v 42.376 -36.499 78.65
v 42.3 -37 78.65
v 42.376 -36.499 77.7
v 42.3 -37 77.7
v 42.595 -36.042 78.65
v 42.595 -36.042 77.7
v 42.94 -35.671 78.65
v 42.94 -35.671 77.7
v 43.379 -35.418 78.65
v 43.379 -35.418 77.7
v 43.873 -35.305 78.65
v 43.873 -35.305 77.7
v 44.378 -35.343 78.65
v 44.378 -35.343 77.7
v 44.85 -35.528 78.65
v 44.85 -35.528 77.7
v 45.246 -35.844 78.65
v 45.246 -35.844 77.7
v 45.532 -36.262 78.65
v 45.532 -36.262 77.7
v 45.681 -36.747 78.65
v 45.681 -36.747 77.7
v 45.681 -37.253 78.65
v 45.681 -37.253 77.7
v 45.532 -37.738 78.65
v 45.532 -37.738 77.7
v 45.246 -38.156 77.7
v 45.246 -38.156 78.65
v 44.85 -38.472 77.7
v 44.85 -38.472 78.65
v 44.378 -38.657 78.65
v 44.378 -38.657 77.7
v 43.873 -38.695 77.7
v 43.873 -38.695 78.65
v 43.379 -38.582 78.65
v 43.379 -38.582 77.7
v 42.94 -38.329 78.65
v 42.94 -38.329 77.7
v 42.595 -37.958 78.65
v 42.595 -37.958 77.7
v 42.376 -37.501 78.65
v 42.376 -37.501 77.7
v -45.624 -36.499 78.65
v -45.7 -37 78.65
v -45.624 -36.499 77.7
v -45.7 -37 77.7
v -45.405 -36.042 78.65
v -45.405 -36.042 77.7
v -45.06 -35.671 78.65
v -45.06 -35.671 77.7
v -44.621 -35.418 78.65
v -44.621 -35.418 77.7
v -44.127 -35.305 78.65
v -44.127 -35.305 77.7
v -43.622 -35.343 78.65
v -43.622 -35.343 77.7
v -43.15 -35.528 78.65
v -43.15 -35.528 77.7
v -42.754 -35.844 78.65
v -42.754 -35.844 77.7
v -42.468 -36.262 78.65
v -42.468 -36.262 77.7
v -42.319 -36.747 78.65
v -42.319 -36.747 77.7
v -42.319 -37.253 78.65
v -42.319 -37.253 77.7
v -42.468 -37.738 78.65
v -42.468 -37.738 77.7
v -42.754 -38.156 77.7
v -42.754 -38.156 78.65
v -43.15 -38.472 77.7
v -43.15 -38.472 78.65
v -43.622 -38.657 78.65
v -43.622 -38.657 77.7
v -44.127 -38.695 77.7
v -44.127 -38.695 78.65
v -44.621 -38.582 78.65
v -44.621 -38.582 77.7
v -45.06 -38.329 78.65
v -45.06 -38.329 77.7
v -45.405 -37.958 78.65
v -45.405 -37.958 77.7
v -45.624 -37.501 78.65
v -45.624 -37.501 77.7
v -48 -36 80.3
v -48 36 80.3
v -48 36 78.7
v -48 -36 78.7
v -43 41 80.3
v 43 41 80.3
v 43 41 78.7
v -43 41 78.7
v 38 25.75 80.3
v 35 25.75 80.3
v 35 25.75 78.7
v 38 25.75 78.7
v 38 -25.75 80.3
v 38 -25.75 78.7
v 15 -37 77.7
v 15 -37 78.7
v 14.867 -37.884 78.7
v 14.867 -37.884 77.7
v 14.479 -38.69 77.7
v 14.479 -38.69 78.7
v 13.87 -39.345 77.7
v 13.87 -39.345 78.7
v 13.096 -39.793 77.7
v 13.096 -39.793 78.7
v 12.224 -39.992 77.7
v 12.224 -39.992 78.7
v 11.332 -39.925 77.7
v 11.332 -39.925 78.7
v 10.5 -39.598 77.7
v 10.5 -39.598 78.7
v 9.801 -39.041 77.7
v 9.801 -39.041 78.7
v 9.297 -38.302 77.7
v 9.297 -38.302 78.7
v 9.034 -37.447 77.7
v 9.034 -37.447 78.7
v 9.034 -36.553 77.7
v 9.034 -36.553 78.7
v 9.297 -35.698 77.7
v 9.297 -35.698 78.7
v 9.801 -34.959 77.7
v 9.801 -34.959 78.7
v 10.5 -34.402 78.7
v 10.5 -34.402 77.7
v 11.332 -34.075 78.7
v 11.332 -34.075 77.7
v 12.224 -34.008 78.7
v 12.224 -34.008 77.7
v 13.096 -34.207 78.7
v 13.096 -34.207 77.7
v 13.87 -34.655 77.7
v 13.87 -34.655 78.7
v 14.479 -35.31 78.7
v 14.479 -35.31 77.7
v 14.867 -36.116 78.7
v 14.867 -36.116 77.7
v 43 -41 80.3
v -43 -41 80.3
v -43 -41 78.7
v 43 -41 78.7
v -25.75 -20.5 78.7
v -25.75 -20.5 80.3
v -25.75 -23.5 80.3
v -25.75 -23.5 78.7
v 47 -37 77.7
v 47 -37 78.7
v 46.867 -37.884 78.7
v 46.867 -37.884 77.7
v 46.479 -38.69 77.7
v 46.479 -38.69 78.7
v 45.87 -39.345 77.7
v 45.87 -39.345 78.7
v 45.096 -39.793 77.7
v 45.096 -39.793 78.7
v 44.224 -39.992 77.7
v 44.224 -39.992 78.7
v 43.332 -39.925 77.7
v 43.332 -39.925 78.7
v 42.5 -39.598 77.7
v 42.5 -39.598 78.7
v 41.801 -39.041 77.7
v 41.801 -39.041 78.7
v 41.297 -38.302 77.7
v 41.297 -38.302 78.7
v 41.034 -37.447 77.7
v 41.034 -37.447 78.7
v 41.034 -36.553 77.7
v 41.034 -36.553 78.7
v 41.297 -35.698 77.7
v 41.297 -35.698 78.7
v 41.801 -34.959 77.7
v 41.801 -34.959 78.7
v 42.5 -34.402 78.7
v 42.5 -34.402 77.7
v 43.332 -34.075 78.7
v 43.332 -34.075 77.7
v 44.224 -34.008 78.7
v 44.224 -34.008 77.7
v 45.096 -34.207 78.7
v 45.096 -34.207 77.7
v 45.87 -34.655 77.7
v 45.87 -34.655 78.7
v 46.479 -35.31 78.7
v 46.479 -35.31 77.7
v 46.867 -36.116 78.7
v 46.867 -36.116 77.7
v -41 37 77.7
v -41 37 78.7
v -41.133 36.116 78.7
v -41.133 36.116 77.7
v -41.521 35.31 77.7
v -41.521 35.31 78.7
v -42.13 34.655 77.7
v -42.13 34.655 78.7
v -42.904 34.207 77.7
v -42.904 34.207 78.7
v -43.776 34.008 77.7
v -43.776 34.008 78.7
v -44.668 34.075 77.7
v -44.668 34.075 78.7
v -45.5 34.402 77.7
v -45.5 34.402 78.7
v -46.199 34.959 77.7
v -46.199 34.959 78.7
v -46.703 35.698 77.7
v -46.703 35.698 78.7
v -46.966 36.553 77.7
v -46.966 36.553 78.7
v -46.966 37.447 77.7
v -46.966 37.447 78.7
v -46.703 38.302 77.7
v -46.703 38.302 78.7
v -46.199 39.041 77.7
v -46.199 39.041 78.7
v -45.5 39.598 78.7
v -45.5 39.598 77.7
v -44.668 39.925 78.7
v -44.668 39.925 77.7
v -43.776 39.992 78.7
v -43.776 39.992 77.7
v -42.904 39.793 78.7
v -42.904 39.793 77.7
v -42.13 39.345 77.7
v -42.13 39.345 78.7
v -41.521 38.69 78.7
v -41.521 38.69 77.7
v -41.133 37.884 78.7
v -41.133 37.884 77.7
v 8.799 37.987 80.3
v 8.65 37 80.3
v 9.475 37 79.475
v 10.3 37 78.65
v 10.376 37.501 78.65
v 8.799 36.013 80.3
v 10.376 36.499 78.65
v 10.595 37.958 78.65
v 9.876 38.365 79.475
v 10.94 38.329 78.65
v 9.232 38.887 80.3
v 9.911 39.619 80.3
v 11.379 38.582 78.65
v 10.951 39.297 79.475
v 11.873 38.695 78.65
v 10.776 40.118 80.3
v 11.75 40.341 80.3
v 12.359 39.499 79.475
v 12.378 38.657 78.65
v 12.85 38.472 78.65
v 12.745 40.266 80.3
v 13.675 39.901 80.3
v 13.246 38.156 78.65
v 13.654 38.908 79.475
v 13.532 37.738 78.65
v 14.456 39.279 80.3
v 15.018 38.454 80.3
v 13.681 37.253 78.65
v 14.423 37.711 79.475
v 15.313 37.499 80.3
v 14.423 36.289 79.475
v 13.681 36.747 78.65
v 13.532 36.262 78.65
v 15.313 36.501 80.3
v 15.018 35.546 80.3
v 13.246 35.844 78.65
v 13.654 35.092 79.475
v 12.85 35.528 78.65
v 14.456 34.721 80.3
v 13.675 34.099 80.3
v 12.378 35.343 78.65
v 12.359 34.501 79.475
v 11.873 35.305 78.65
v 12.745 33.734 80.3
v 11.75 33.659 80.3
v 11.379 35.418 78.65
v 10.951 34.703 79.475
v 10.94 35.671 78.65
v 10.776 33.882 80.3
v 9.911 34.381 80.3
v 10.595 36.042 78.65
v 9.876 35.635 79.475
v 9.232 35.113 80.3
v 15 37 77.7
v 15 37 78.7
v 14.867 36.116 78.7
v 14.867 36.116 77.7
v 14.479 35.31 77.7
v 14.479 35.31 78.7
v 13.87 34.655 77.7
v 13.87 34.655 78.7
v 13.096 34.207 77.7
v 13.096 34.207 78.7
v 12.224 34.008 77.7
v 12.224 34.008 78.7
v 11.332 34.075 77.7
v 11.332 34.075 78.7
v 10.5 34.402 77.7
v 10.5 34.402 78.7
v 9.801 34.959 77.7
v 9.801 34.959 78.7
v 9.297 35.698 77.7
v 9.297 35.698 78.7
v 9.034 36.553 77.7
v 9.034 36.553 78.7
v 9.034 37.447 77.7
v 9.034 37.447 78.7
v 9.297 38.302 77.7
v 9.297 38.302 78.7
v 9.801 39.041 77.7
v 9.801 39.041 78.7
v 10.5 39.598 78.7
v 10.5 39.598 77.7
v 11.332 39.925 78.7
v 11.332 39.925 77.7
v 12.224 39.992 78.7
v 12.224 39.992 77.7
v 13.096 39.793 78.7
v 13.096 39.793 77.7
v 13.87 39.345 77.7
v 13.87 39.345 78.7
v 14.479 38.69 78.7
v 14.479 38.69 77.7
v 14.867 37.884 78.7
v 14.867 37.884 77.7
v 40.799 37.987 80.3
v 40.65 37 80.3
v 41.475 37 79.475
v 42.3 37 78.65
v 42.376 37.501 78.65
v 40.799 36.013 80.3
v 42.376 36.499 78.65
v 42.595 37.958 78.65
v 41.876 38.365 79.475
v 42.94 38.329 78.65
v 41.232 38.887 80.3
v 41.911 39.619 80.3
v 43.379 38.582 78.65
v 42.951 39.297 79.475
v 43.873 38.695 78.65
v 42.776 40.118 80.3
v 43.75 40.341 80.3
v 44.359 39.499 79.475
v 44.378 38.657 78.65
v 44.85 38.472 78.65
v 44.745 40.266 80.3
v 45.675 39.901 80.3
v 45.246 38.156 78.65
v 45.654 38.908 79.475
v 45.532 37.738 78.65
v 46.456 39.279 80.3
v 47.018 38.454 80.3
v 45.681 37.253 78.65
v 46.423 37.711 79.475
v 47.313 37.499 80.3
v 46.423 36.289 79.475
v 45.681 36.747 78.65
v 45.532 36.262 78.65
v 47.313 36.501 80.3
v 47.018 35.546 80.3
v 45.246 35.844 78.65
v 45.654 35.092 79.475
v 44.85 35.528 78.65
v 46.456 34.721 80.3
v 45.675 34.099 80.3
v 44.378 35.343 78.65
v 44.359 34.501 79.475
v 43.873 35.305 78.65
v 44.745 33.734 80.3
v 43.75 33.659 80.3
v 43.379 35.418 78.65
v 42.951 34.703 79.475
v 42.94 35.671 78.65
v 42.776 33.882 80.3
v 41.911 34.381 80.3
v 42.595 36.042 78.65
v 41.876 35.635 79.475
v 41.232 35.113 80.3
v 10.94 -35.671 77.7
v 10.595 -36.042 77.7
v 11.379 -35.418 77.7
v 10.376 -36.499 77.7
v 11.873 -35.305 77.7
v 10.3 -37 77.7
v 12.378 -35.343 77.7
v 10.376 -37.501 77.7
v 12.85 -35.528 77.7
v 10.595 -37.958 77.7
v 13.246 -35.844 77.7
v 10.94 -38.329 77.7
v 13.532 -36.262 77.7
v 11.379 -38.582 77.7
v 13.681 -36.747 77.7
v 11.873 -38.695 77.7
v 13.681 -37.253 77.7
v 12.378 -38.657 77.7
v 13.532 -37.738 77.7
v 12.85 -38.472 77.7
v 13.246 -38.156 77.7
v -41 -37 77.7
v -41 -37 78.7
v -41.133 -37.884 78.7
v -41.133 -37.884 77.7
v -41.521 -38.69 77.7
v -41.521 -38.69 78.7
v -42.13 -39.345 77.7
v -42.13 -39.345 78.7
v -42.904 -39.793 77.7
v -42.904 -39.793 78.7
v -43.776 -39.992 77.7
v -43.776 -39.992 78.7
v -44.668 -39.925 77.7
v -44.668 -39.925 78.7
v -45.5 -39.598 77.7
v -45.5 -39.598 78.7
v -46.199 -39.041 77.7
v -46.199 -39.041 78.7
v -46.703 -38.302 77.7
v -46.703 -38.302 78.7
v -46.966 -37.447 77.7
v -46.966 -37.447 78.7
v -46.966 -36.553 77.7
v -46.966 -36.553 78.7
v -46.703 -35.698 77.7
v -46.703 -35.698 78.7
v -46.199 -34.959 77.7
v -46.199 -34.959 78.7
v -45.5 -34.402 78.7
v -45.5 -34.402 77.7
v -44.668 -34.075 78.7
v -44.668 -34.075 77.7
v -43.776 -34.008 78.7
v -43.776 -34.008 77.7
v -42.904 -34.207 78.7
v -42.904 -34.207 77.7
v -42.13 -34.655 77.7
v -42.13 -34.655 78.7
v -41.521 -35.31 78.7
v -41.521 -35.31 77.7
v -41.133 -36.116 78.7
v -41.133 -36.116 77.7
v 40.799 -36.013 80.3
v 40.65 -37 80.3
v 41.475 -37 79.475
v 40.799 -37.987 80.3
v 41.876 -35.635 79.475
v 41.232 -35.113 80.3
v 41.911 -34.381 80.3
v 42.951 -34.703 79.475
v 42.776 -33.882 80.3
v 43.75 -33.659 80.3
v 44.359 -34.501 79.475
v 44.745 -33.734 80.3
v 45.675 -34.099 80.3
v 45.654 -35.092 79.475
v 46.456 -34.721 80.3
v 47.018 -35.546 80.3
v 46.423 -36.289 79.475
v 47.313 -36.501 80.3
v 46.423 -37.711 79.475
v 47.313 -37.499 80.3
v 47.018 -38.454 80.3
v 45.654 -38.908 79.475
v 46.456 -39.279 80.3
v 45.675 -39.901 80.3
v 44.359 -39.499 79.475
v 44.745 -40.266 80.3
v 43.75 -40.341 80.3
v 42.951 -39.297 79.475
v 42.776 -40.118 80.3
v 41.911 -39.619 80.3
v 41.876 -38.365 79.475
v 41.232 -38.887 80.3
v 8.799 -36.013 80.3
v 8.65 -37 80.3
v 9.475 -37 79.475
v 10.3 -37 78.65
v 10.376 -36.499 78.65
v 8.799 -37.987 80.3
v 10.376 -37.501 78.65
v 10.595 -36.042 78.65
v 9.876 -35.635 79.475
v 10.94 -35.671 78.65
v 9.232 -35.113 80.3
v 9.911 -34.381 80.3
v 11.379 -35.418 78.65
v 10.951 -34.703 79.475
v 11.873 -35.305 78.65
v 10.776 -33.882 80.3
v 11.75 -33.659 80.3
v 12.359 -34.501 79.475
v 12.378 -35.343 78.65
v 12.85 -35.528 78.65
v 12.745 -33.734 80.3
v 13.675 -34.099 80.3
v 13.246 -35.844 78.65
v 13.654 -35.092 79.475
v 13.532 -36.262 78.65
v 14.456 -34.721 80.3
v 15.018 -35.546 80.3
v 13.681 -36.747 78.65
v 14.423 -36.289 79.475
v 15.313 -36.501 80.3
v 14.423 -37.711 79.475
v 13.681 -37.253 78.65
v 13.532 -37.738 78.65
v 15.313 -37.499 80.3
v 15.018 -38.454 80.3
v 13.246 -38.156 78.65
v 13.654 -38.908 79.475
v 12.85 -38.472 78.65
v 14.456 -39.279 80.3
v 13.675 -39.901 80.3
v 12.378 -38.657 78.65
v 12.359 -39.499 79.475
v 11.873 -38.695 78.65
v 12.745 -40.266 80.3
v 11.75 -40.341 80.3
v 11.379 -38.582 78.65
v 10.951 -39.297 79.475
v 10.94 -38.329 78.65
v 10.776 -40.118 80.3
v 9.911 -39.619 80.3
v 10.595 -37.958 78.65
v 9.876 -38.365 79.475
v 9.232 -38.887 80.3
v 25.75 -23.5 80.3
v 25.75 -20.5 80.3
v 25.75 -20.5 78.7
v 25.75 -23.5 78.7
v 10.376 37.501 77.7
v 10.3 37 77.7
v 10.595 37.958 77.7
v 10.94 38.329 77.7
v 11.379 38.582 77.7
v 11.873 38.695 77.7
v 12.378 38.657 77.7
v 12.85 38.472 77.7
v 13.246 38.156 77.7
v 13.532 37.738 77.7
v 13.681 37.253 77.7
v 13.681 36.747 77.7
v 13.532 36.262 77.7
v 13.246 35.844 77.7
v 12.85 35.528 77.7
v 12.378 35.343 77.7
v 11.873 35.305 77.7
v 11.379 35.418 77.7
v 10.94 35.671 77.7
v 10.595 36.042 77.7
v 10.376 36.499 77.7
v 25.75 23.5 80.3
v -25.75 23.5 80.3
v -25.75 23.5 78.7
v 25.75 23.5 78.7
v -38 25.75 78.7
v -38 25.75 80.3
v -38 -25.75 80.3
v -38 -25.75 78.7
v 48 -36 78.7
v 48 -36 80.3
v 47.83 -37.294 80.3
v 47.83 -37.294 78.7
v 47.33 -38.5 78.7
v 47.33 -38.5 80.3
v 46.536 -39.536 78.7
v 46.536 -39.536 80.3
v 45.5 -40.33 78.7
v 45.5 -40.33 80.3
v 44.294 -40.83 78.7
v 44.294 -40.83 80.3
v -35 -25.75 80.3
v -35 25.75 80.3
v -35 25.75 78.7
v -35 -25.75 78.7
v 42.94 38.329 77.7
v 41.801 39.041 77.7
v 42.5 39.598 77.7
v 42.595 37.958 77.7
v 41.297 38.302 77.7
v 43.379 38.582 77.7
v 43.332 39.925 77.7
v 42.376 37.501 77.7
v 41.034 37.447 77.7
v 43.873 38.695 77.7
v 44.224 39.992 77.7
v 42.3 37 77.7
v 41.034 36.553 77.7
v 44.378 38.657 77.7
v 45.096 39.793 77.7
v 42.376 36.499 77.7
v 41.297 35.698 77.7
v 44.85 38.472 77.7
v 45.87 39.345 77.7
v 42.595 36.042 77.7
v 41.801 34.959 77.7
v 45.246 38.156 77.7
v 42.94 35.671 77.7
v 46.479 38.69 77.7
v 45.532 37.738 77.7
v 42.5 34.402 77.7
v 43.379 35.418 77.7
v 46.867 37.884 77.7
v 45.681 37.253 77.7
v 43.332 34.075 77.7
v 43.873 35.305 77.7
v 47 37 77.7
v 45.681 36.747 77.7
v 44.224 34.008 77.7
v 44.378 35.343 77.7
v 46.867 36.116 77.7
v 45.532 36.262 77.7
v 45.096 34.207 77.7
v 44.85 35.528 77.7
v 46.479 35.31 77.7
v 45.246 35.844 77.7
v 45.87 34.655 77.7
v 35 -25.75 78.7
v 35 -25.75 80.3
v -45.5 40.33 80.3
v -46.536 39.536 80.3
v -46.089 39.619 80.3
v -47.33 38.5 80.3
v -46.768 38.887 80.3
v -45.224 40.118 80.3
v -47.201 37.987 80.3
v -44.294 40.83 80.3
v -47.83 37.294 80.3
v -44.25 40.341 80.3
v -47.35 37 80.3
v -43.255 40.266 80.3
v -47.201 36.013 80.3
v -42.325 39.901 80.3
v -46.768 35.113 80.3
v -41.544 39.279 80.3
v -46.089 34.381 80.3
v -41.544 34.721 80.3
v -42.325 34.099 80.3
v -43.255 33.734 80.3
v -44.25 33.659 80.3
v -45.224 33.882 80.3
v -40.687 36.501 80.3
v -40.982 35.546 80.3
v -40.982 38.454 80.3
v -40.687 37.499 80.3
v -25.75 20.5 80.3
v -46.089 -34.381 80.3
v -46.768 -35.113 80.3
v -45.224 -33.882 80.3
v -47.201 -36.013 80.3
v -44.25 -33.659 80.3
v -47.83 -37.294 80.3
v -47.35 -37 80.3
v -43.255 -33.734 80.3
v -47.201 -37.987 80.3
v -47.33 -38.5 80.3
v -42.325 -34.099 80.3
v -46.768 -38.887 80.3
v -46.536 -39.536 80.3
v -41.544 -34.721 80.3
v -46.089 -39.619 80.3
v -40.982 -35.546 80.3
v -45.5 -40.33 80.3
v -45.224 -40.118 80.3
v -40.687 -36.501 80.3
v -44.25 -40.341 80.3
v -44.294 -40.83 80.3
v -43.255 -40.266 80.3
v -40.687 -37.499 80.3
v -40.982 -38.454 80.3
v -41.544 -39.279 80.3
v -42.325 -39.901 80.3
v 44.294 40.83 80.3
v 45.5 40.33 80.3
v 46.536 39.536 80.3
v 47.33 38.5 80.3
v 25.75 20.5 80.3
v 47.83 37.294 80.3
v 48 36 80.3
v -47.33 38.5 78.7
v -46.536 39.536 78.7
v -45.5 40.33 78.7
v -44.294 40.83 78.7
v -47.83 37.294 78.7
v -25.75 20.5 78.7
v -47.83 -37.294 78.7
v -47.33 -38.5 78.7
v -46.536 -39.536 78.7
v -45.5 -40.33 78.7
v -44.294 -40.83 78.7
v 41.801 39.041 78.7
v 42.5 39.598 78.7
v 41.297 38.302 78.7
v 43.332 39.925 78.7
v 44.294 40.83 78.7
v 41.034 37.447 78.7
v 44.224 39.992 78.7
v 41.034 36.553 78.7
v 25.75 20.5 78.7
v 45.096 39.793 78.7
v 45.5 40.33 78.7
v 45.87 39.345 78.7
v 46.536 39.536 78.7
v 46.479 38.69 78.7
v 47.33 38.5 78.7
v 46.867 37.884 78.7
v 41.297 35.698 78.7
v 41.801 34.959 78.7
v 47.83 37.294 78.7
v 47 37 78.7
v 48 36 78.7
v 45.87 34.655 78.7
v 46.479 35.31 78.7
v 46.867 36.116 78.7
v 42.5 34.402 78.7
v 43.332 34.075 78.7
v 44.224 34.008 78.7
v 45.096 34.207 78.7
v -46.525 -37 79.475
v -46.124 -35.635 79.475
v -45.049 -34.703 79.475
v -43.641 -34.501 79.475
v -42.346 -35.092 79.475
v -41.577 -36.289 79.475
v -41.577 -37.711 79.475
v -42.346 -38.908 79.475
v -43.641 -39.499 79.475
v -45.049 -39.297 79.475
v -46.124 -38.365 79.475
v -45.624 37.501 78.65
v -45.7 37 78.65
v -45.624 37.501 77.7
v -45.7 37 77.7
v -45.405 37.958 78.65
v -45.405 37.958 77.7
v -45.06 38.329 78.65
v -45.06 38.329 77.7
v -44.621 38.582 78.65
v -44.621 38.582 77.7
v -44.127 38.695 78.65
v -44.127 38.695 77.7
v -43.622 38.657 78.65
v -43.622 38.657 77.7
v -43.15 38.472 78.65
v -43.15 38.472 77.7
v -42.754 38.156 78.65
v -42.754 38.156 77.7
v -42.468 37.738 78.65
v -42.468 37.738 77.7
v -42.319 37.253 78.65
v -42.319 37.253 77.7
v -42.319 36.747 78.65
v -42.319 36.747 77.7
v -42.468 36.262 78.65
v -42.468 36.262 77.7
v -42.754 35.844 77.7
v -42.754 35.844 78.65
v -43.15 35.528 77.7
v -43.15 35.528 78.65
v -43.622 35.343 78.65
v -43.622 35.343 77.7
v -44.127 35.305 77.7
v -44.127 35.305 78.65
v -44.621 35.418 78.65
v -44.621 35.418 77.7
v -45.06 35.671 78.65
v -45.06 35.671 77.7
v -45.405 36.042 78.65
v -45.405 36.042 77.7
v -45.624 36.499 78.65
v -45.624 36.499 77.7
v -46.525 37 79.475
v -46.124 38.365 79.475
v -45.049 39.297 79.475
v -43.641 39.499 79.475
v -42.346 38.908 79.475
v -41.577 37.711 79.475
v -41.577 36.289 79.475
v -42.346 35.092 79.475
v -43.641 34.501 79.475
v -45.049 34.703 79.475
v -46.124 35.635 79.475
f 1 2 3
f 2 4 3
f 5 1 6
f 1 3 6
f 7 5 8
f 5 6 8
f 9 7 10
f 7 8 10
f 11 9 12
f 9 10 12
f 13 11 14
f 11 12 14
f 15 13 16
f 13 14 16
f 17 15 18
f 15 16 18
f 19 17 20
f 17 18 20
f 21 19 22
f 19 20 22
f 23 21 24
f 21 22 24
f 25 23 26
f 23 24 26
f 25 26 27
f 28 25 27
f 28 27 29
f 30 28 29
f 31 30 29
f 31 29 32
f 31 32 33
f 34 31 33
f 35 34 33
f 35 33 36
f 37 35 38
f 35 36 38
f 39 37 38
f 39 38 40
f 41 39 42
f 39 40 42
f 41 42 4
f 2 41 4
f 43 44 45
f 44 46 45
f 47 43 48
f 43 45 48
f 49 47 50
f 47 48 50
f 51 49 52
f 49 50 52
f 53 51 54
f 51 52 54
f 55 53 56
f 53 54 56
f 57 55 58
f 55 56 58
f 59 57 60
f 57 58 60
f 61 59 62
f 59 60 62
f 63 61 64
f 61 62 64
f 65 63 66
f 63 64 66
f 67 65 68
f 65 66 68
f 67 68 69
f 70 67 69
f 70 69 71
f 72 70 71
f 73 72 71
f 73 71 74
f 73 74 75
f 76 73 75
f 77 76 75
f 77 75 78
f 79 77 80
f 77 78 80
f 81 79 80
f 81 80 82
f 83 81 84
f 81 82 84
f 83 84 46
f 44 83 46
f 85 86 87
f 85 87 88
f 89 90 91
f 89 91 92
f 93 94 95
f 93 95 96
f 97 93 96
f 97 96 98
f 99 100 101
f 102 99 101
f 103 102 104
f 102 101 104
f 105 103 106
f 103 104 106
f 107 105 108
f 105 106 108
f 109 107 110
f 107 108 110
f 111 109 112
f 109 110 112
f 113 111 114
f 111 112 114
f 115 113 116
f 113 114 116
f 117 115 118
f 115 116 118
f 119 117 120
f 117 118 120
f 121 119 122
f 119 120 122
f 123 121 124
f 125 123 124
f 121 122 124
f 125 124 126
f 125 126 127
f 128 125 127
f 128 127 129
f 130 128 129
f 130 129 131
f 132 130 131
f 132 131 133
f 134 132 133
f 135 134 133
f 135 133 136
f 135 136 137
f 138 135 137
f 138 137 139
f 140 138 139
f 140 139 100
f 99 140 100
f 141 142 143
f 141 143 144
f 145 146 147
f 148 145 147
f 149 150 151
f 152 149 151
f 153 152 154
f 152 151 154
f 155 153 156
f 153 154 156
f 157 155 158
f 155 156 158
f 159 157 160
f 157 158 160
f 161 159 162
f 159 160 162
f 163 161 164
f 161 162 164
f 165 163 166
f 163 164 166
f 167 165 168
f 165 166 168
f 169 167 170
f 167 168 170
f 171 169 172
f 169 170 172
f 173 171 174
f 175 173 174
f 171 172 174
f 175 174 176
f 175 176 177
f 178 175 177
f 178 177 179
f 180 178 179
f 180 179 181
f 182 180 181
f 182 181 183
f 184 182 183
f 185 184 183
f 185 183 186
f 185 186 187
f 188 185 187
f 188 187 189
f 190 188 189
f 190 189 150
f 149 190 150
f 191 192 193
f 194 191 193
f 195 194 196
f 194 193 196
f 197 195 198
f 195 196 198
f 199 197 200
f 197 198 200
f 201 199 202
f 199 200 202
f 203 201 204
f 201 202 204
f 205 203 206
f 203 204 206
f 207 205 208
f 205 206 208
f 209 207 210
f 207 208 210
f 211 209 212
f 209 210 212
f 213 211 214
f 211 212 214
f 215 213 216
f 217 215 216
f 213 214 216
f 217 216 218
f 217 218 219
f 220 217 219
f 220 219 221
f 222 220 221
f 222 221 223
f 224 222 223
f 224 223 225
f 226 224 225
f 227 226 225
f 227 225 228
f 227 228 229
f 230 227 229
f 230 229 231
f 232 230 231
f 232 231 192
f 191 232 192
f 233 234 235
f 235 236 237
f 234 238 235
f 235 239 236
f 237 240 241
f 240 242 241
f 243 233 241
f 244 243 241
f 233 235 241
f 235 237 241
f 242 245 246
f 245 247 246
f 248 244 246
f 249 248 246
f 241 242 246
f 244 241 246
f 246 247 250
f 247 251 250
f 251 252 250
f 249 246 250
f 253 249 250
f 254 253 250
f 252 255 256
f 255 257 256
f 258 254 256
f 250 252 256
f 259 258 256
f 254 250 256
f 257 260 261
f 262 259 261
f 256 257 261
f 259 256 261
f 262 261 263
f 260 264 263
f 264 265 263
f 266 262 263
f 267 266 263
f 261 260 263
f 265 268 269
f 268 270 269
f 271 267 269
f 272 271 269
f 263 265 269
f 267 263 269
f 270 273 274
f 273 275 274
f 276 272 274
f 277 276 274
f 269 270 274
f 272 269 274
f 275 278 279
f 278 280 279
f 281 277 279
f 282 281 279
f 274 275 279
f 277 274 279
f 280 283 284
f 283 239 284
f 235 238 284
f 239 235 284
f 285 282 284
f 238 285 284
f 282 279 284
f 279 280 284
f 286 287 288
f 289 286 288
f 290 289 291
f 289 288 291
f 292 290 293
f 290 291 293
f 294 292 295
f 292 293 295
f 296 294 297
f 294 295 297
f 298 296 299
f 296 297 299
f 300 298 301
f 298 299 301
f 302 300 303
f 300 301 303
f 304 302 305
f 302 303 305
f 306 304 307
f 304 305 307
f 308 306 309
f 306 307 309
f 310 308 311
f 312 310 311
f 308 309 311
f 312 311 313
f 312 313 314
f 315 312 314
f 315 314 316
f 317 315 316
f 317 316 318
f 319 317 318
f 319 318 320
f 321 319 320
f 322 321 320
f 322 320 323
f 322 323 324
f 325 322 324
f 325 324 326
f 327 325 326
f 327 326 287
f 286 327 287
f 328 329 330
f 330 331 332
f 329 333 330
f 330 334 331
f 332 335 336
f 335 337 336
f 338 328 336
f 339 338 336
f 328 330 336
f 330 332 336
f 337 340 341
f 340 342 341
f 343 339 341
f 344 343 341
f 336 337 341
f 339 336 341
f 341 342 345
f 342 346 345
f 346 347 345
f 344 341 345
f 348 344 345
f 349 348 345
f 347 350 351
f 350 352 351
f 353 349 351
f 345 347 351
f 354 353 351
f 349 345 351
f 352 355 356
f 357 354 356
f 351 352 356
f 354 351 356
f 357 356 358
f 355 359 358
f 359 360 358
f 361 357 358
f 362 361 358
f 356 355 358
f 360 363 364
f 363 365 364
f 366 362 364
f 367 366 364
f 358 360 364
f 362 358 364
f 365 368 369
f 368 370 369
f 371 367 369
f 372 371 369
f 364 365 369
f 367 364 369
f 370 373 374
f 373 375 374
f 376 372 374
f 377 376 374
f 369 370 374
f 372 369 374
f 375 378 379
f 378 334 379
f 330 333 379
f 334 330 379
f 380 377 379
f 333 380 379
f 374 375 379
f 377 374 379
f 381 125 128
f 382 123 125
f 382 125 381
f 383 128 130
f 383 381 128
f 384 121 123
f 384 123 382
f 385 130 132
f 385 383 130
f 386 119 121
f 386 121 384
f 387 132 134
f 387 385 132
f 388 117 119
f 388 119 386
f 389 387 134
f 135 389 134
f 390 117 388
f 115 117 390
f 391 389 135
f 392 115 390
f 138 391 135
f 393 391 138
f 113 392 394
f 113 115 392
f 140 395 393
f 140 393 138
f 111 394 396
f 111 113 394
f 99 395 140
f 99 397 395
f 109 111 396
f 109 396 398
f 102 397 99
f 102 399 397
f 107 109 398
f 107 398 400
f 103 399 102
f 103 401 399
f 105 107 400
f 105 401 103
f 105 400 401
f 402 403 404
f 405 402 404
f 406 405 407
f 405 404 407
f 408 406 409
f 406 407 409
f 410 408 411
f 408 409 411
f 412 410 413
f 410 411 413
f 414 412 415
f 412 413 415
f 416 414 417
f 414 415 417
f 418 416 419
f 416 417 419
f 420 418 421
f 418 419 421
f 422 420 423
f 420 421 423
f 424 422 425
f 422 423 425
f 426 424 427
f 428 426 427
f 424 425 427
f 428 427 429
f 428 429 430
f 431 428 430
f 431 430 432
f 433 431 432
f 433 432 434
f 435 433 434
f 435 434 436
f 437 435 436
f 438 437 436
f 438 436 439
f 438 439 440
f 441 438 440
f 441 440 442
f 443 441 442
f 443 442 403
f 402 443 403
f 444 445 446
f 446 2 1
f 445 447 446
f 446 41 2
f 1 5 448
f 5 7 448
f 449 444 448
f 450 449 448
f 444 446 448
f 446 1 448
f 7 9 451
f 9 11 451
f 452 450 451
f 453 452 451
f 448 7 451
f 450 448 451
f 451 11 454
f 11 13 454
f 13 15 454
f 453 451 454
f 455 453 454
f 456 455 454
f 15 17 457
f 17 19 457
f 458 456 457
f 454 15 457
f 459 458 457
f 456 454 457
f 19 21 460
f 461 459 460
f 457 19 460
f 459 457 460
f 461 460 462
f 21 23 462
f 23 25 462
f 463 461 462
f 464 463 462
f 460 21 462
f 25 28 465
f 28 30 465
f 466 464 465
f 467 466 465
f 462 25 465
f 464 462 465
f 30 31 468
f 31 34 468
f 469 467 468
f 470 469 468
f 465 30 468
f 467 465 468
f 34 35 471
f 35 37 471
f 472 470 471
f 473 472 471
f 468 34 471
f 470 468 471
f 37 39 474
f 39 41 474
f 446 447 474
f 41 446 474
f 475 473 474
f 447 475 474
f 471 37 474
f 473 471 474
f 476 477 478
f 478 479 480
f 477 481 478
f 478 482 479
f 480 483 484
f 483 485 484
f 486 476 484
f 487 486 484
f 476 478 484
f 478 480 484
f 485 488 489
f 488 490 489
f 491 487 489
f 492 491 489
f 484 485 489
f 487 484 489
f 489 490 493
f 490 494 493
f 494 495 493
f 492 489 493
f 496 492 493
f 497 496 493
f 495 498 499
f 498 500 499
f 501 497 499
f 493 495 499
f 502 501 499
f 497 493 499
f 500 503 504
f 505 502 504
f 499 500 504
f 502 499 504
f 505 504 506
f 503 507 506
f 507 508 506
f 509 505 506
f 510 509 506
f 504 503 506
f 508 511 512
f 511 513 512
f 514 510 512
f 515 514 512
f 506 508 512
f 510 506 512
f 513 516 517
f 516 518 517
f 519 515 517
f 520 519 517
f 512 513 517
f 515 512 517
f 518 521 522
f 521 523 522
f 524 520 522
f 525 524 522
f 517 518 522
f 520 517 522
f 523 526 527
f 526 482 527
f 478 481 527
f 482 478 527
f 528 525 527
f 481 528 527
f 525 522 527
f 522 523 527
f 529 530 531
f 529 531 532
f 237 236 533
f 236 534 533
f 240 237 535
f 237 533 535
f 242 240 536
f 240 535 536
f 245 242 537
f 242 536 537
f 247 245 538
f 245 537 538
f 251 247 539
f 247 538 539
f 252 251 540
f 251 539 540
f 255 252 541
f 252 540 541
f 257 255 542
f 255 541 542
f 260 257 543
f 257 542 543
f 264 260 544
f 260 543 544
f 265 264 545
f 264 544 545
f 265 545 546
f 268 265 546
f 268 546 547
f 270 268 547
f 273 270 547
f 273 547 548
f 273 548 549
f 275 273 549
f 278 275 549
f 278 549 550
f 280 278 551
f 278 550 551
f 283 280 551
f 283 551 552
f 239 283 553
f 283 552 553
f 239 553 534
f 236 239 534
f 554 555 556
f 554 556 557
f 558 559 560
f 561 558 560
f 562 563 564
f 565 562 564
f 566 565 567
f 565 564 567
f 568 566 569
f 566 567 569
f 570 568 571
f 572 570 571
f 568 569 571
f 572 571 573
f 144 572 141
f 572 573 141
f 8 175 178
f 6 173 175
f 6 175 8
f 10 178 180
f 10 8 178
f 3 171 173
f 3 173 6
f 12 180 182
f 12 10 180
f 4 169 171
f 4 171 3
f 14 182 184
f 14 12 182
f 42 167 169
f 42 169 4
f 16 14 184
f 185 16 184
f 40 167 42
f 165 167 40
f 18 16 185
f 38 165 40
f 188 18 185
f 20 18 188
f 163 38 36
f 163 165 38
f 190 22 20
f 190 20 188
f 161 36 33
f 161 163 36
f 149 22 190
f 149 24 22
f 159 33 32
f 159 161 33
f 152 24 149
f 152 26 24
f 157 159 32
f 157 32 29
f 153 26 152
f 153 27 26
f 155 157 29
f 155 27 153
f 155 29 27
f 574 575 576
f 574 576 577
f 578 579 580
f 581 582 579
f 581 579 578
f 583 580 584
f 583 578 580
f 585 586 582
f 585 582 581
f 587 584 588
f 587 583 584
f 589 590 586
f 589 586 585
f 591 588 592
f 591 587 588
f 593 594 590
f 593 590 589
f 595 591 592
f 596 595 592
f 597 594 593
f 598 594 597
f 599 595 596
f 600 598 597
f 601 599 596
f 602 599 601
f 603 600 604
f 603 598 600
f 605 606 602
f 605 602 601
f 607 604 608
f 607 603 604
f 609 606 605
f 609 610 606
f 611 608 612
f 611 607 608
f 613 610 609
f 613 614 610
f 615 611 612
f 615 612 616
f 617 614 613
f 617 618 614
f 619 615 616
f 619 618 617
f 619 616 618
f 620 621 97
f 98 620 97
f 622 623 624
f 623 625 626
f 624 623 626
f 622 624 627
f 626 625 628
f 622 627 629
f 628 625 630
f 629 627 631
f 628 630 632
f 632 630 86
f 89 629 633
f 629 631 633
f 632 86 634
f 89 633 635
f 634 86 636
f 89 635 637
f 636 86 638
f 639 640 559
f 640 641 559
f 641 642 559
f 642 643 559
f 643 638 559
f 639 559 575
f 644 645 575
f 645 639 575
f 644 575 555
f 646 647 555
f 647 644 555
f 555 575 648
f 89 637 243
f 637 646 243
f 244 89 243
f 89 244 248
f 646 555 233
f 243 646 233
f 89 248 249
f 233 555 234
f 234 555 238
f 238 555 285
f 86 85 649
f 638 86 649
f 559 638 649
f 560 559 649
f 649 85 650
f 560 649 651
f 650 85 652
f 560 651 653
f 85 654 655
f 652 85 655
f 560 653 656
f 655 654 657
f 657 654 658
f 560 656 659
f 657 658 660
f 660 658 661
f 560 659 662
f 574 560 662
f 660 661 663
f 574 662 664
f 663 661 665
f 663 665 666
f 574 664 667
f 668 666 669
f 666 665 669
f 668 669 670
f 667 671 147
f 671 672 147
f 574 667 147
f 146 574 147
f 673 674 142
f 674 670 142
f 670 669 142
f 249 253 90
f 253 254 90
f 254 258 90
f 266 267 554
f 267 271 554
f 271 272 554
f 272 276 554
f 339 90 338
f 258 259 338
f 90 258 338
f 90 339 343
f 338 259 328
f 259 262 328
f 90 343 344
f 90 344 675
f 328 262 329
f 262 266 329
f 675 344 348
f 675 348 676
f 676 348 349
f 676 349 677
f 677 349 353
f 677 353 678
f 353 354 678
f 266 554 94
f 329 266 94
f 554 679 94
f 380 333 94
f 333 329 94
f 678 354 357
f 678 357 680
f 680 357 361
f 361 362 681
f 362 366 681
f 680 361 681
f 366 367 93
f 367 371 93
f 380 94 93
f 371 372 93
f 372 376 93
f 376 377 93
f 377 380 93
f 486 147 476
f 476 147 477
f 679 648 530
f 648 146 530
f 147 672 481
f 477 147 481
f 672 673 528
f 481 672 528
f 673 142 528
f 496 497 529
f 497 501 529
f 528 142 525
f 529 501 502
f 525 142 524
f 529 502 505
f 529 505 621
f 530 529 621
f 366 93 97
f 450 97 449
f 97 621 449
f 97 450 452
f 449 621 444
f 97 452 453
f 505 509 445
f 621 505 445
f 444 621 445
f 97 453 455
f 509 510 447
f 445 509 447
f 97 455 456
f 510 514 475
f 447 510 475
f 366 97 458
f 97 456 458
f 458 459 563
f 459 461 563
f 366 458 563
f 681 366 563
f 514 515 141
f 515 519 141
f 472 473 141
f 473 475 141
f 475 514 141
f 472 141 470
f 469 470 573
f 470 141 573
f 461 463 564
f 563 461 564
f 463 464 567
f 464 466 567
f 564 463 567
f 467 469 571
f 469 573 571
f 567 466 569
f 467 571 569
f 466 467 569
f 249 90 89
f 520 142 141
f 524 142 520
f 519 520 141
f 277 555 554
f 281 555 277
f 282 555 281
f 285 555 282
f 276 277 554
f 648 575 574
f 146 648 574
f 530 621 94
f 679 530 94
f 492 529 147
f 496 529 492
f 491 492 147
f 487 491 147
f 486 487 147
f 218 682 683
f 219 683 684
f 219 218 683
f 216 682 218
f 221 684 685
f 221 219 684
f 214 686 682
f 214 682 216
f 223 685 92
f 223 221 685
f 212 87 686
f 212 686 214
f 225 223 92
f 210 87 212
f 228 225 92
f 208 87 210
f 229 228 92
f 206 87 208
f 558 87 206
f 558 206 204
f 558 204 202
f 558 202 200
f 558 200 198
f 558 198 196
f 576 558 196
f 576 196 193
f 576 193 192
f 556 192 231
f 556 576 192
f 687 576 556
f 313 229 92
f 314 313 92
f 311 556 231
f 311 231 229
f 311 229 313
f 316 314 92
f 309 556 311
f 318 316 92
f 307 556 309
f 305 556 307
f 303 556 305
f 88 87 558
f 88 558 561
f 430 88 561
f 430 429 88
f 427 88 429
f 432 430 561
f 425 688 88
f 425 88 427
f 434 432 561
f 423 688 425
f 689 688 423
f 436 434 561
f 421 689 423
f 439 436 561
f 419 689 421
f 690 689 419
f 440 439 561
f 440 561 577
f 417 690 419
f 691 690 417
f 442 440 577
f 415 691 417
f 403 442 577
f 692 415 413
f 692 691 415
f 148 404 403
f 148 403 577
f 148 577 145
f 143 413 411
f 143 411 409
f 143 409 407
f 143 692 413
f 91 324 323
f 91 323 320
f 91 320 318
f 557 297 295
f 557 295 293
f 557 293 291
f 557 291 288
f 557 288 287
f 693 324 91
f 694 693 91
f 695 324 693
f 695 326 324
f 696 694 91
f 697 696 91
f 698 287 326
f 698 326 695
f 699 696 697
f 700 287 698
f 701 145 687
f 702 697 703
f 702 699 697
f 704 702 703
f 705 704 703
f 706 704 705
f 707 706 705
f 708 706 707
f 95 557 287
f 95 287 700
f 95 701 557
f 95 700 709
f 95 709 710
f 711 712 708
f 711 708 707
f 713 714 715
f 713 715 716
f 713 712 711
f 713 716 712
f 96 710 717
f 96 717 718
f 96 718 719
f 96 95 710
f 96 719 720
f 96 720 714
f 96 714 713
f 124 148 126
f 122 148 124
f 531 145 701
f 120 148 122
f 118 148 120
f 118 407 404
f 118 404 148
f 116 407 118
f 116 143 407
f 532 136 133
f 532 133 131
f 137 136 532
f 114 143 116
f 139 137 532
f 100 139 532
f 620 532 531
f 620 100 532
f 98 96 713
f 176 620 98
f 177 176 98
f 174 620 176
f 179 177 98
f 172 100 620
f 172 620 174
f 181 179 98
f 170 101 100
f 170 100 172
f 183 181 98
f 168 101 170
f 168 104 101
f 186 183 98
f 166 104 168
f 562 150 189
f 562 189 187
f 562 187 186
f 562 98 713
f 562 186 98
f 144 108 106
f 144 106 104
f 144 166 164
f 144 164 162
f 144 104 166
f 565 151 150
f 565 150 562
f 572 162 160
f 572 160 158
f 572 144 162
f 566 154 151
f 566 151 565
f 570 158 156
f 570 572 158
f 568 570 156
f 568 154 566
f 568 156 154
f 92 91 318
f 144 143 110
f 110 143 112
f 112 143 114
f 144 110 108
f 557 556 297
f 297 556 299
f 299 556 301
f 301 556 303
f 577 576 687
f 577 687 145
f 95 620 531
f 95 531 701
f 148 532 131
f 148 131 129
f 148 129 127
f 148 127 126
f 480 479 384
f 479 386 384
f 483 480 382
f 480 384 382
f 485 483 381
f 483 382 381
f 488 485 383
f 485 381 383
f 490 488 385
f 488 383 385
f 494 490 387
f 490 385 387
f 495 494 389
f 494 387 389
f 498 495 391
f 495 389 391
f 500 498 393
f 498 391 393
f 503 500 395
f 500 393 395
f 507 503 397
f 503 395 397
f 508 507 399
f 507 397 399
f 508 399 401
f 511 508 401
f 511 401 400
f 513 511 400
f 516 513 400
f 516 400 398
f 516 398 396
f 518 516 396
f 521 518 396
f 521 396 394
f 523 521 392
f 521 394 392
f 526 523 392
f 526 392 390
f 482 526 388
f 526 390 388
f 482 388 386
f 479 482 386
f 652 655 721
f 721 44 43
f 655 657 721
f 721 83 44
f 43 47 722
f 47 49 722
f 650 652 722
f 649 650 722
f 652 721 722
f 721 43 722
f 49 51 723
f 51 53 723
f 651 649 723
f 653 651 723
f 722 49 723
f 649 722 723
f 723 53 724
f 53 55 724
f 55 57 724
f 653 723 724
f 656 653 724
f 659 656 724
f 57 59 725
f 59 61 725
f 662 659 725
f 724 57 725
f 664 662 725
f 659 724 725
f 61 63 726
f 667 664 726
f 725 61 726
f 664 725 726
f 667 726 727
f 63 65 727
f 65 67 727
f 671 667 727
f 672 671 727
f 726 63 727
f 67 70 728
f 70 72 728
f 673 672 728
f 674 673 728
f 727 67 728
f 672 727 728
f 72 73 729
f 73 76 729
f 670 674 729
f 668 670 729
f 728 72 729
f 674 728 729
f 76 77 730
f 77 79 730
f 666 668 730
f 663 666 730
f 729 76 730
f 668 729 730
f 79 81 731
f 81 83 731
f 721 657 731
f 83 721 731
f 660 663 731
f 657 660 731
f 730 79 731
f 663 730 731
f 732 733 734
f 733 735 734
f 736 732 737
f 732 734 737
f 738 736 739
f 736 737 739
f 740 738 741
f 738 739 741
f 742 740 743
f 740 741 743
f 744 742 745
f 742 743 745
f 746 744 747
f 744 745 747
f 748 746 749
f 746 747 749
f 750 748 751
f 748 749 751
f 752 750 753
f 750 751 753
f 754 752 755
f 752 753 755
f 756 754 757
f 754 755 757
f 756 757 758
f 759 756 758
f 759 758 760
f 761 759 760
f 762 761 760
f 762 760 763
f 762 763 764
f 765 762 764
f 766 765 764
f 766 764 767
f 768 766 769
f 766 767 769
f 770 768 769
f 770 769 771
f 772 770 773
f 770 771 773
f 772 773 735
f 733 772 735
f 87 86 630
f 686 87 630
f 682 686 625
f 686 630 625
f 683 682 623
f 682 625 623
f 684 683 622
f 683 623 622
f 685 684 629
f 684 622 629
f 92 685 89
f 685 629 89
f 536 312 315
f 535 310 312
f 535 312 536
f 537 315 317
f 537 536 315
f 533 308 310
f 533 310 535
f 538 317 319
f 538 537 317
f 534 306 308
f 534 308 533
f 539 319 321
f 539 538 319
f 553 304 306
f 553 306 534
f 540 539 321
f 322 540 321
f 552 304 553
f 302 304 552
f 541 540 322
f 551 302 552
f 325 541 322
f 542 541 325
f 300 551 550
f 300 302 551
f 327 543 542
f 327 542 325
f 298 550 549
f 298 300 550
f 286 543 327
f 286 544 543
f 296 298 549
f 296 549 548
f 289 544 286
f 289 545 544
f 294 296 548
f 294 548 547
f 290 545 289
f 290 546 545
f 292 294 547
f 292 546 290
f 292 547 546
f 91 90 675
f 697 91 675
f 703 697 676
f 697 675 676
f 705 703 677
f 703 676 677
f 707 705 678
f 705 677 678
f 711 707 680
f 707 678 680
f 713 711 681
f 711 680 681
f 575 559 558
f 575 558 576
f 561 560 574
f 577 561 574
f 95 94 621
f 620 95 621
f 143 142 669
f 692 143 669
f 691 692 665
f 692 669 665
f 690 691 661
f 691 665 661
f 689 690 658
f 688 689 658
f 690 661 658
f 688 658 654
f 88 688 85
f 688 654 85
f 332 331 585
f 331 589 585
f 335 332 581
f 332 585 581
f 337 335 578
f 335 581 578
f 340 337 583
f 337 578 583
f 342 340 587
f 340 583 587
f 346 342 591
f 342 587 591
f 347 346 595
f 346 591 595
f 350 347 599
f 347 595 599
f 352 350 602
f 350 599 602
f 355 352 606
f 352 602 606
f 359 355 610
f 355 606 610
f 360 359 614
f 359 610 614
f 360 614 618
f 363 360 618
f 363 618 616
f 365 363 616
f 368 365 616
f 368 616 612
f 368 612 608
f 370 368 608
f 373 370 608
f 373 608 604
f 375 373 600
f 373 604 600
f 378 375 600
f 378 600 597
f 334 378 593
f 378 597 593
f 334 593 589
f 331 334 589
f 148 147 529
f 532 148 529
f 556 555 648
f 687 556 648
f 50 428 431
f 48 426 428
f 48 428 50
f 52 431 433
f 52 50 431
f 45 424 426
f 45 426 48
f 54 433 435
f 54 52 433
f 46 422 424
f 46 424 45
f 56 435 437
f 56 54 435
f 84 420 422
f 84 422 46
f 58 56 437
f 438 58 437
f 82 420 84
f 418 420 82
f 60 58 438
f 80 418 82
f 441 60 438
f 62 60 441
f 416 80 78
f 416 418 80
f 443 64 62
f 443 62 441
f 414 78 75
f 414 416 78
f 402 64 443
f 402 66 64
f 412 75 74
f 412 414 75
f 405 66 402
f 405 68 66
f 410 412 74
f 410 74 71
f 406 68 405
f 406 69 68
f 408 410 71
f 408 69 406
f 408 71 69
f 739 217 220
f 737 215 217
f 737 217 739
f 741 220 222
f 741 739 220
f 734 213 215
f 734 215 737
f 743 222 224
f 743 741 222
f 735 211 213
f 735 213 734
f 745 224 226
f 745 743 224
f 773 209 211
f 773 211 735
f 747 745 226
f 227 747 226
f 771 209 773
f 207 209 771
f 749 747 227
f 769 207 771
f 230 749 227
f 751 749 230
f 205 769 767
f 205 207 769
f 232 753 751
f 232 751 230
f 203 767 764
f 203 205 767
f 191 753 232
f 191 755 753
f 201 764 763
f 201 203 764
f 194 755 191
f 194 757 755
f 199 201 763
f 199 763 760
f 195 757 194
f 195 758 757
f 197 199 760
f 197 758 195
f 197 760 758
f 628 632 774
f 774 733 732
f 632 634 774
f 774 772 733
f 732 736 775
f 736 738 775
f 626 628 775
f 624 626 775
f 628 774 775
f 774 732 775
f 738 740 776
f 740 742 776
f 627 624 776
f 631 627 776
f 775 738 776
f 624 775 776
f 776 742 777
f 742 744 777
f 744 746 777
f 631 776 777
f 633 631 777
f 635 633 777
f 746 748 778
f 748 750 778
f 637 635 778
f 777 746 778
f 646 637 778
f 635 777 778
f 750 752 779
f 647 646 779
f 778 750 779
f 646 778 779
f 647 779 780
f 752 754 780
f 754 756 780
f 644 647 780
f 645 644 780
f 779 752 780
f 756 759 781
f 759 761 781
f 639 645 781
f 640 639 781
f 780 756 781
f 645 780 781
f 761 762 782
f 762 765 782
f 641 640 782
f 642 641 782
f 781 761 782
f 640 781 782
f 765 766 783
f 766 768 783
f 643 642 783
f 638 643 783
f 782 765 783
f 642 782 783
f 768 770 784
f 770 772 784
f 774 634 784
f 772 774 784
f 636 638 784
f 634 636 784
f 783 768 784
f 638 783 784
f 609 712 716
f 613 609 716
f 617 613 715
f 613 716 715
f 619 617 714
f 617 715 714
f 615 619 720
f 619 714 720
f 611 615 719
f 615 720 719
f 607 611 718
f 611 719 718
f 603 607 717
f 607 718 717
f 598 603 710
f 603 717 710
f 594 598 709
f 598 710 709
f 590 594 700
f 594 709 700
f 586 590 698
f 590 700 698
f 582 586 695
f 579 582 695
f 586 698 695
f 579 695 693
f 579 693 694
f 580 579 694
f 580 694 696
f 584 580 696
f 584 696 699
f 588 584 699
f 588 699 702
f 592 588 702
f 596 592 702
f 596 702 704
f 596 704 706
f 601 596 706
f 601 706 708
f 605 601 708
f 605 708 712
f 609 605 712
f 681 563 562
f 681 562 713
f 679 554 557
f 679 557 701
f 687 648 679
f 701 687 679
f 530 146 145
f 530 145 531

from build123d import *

# Parameters (mm, degrees)
SKETCH021_W             = 51.5
SKETCH021_H             = 3
SKETCH021_W_2           = 3
SKETCH021_H_2           = 51.5
PAD014_DEPTH            = 1.6
SKETCH022_R             = 3
PAD015_DEPTH            = 2.6
HOLE_D                  = 3.4
HOLE_DEPTH              = 25
HOLE_CSINK_D            = 6.7
HOLE_CSINK_ANGLE        = 90
BODY005_PLACEMENT_ANGLE = 180


with BuildPart() as part:
    # Sketch021 → Pad014 (new body)
    with BuildSketch(Plane.XY):
        with BuildLine():
            ThreePointArc((-43, 41), (-46.535534, 39.535534), (-48, 36))
            Line((-48, -36), (-48, 36))
            ThreePointArc((-48, -36), (-46.535534, -39.535534), (-43, -41))
            Line((43, -41), (-43, -41))
            ThreePointArc((43, -41), (46.535534, -39.535534), (48, -36))
            Line((48, 36), (48, -36))
            ThreePointArc((48, 36), (46.535534, 39.535534), (43, 41))
            Line((-43, 41), (43, 41))
        make_face()
        with Locations((0, 22)):
            Rectangle(SKETCH021_W, SKETCH021_H, mode=Mode.SUBTRACT)
        with Locations((0, -22)):
            Rectangle(SKETCH021_W, SKETCH021_H, mode=Mode.SUBTRACT)
        with Locations((-36.5, 0)):
            Rectangle(SKETCH021_W_2, SKETCH021_H_2, mode=Mode.SUBTRACT)
        with Locations((36.5, 0)):
            Rectangle(SKETCH021_W_2, SKETCH021_H_2, mode=Mode.SUBTRACT)
    extrude(amount=PAD014_DEPTH)

    # Sketch022 → Pad015 (join)
    with BuildSketch(Plane.XY):
        with Locations((-44, 37)):
            Circle(SKETCH022_R)
        with Locations((12, 37)):
            Circle(SKETCH022_R)
        with Locations((44, 37)):
            Circle(SKETCH022_R)
        with Locations((44, -37)):
            Circle(SKETCH022_R)
        with Locations((12, -37)):
            Circle(SKETCH022_R)
        with Locations((-44, -37)):
            Circle(SKETCH022_R)
    extrude(amount=PAD015_DEPTH)

    # Hole
    with Locations(Plane(origin=(0, 0, 0), x_dir=(1, 0, 0), z_dir=(0, 0, -1))):
        with Locations((-44, -37), (12, -37), (44, -37), (44, 37), (12, 37), (-44, 37)):
            CounterSinkHole(HOLE_D / 2, HOLE_CSINK_D / 2, depth=HOLE_DEPTH, counter_sink_angle=HOLE_CSINK_ANGLE)


with BuildPart() as part_1:
    # Body005 placement: moved
    add(part.part.moved(Location((0, 0, 80.3))).rotate(Axis((0, 0, 80.3), (1, 0, 0)), BODY005_PLACEMENT_ANGLE))


solid = part_1.part
